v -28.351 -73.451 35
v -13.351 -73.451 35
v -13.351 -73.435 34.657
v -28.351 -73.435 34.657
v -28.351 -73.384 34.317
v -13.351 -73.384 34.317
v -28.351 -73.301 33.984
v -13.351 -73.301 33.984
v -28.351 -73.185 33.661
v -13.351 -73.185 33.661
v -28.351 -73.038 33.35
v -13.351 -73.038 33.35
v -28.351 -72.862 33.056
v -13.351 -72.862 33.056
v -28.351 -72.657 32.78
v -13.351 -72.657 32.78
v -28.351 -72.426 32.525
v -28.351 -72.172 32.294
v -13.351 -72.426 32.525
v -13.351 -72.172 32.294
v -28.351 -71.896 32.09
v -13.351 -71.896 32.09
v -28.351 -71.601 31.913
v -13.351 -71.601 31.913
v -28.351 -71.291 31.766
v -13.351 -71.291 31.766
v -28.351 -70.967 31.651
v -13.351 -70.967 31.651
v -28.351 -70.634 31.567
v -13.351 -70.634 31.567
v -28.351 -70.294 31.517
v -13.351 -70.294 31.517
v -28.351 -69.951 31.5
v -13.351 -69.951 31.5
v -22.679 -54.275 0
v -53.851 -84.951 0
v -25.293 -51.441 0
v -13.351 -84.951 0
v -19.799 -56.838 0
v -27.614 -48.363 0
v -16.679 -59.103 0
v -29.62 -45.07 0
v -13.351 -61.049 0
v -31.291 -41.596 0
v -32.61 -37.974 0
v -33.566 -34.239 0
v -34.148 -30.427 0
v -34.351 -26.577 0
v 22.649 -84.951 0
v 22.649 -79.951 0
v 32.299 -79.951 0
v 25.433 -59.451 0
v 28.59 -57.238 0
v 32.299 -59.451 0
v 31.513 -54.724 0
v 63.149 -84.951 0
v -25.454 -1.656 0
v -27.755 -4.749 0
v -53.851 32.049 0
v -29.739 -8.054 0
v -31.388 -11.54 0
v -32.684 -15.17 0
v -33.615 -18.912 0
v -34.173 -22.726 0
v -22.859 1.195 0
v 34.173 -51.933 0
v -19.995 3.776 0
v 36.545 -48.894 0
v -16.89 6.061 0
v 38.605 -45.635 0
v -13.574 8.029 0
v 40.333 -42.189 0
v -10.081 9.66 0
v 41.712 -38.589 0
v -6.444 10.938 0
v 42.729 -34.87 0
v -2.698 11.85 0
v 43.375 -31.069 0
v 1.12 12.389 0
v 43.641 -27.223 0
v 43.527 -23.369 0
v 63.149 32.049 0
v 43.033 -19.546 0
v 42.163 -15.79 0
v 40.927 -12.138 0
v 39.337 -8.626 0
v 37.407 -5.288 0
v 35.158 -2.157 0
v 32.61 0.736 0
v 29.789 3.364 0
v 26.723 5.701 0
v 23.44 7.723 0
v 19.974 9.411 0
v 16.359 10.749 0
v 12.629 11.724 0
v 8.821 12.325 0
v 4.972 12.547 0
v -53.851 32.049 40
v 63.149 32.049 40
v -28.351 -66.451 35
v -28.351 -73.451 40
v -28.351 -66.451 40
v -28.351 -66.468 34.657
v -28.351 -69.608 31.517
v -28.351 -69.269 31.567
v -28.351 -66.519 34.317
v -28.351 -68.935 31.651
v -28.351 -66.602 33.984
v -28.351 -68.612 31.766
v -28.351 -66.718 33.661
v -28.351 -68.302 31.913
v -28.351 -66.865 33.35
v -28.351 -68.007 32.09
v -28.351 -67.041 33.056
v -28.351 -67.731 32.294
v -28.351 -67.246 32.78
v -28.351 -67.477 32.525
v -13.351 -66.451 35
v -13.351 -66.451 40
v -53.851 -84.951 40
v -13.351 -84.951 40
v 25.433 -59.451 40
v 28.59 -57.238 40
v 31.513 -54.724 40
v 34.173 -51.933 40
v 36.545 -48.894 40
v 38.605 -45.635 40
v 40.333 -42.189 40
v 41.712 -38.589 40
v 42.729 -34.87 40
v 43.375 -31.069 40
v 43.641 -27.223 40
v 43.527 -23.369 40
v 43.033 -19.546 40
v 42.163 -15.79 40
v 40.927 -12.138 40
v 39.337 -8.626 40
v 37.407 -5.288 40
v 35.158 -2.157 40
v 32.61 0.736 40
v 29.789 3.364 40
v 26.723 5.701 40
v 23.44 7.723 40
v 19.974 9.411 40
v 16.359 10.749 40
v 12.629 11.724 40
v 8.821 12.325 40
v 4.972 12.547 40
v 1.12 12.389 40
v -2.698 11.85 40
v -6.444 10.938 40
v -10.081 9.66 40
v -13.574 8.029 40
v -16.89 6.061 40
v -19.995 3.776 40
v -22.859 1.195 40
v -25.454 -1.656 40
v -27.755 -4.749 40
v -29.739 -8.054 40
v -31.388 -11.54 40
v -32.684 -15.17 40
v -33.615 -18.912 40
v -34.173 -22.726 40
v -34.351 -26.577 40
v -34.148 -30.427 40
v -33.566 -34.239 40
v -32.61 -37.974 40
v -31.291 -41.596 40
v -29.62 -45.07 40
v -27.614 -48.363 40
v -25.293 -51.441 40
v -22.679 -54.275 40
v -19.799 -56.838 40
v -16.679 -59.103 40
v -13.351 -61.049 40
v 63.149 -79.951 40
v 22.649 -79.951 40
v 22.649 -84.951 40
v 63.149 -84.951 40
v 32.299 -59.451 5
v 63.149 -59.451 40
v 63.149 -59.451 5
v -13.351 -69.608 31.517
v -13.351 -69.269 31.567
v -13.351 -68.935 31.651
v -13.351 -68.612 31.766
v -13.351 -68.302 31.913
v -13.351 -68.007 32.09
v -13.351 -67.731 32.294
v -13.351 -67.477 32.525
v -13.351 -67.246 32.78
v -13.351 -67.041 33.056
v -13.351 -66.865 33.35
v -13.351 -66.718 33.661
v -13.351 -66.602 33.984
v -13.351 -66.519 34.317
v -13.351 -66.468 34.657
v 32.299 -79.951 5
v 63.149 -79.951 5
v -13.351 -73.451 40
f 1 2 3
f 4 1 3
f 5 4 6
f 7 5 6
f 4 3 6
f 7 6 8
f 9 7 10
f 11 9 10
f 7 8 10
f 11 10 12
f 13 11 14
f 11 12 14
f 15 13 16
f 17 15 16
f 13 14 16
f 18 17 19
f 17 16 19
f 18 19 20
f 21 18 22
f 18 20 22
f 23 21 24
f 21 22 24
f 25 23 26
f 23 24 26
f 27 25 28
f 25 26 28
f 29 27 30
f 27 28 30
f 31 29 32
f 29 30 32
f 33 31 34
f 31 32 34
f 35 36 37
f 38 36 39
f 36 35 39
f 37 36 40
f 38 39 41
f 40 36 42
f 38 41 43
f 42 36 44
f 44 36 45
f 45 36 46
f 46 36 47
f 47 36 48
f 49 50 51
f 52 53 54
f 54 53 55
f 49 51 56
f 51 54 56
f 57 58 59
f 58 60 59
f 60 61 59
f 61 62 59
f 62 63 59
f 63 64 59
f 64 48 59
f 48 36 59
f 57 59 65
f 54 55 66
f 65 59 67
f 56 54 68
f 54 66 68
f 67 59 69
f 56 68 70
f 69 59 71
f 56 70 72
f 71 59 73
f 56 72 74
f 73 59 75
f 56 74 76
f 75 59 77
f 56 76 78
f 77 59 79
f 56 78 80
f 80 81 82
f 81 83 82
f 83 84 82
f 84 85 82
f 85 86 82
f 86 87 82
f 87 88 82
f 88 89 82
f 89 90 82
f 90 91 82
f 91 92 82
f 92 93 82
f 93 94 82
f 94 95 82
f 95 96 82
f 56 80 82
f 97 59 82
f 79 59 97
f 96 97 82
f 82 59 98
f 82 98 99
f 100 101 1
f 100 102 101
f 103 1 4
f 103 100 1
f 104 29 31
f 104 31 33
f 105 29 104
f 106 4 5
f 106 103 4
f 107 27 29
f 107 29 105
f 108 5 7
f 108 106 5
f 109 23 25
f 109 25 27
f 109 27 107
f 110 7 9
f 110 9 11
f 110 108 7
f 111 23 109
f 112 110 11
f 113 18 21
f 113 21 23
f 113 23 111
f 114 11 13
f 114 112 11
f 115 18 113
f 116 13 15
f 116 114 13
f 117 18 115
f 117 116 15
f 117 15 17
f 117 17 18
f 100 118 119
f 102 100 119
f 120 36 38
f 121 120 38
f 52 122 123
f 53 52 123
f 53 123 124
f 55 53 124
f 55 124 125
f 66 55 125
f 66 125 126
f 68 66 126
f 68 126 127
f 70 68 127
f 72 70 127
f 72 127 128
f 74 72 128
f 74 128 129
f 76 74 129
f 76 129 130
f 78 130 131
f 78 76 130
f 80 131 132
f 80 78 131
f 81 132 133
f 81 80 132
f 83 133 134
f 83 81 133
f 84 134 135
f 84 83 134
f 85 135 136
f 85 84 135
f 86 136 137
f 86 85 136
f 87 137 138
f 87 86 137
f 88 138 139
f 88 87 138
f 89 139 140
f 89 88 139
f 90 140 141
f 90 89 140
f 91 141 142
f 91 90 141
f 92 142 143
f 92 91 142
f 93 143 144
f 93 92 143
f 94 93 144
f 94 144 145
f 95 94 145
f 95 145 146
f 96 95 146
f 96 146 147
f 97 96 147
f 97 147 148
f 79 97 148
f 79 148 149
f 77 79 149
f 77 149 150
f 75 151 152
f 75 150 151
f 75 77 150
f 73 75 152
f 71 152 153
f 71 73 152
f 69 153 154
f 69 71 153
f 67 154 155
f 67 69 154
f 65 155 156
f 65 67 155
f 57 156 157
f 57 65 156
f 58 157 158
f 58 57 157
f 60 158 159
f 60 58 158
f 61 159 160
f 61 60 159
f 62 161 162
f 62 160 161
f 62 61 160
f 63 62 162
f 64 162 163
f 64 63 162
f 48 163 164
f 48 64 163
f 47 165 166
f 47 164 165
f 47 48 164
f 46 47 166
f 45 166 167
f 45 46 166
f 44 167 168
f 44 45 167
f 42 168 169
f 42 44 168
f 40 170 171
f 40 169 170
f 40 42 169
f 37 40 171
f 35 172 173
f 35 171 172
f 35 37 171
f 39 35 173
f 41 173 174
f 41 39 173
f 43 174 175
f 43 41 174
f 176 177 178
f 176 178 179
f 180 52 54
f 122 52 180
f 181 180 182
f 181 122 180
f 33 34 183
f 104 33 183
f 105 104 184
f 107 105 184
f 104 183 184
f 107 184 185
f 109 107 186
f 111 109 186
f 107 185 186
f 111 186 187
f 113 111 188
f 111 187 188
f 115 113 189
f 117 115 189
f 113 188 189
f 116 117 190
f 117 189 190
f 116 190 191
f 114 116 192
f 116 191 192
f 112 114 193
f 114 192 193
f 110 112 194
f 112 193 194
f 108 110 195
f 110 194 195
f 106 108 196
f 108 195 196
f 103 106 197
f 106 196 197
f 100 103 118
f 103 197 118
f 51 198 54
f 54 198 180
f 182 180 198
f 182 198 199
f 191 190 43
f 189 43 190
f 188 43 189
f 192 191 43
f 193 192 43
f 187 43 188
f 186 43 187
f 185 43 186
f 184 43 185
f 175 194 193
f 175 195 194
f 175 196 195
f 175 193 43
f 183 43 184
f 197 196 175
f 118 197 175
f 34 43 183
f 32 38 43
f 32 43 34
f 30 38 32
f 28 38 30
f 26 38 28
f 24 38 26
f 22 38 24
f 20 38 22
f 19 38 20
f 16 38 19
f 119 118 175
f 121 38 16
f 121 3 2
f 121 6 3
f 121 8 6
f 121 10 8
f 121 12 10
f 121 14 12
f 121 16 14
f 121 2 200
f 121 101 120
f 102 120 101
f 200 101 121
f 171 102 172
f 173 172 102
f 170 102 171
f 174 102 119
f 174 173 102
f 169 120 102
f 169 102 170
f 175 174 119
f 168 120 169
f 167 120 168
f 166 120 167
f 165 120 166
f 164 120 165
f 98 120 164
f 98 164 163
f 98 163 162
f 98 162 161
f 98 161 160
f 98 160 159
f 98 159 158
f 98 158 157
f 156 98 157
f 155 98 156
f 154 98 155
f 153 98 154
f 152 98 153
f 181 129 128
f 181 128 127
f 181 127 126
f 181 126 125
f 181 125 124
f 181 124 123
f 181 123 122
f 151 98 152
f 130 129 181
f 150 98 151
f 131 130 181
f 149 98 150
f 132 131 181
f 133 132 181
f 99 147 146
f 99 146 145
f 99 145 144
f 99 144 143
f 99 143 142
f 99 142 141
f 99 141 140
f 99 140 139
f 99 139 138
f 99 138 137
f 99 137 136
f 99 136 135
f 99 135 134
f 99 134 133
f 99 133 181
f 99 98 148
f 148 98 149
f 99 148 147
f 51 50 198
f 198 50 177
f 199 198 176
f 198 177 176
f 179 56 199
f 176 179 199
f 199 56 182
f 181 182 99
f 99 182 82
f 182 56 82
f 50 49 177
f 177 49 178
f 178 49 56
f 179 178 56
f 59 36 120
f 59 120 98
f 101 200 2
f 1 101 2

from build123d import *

# Parameters (mm, degrees)
SKETCH_1_W          = 117
SKETCH_1_H          = 117
SKETCH_1_R          = 39
EXTRUDE_1_DEPTH     = 40
CUT_EXTRUDE_1_REACH = 119
SKETCH_2_W          = 36
SKETCH_2_H          = 40
SKETCH_7_W          = 9.65
SKETCH_7_H          = 20.5
CUT_EXTRUDE_4_DEPTH = 40
CUT_EXTRUDE_5_DEPTH = 15
SKETCH_9_W          = 31
SKETCH_9_H          = 20.5
CUT_EXTRUDE_6_DEPTH = 35


with BuildPart() as part:
    # 草圖1 → 填料-伸長1 (new body)
    with BuildSketch(Plane.XY):
        with Locations((4.648877503, -26.451389471)):
            Rectangle(SKETCH_1_W, SKETCH_1_H)
        with Locations((4.648877503, -26.451389471)):
            Circle(SKETCH_1_R, mode=Mode.SUBTRACT)
    extrude(amount=EXTRUDE_1_DEPTH)

    # 草圖2 → 除料-伸長1 (cut, up to next)
    with BuildSketch(Plane.XZ.offset(84.951389471), mode=Mode.PRIVATE) as cut_extrude_1_sk1:
        with Locations((4.648877503, 20)):
            Rectangle(SKETCH_2_W, SKETCH_2_H)
    cut_extrude_1_tool1 = extrude(cut_extrude_1_sk1.sketch, amount=-CUT_EXTRUDE_1_REACH, mode=Mode.PRIVATE) & part.part
    add(cut_extrude_1_tool1.solids().sort_by_distance((4.648878, -84.951389, 20))[0], mode=Mode.SUBTRACT)

    # 草圖7 → 除料-伸長4 (cut)
    with BuildSketch(Plane.XY.offset(40)):
        with Locations((27.473877503, -69.701389471)):
            Rectangle(SKETCH_7_W, SKETCH_7_H)
    extrude(amount=-CUT_EXTRUDE_4_DEPTH, mode=Mode.SUBTRACT)

    # 草圖8 → 除料-伸長5 (cut)
    with BuildSketch(Plane(origin=(-13.351122497, 0, 0), x_dir=(0, 0, -1), z_dir=(1, 0, 0))):
        with BuildLine():
            Line((-40, -66.451389471), (-40, -73.451389471))
            Line((-40, -73.451389471), (-35, -73.451389471))
            ThreePointArc((-35, -73.451389471), (-38.5, -69.951389471), (-35, -66.451389471))
            Line((-35, -66.451389471), (-40, -66.451389471))
        make_face()
        with BuildLine():
            ThreePointArc((-35, -66.451389471), (-38.5, -69.951389471), (-35, -73.451389471))
            Line((-35, -73.451389471), (-35, -66.451389471))
        make_face()
        with BuildLine():
            Line((-35, -66.451389471), (-35, -73.451389471))
            ThreePointArc((-35, -73.451389471), (-32.525126266, -72.426263205), (-31.5, -69.951389471))
            ThreePointArc((-31.5, -69.951389471), (-32.525126266, -67.476515737), (-35, -66.451389471))
        make_face()
    extrude(amount=-CUT_EXTRUDE_5_DEPTH, mode=Mode.SUBTRACT)

    # 草圖9 → 除料-伸長6 (cut)
    with BuildSketch(Plane.XY.offset(40)):
        with Locations((47.798877503, -69.701389471)):
            Rectangle(SKETCH_9_W, SKETCH_9_H)
    extrude(amount=-CUT_EXTRUDE_6_DEPTH, mode=Mode.SUBTRACT)


solid = part.part
